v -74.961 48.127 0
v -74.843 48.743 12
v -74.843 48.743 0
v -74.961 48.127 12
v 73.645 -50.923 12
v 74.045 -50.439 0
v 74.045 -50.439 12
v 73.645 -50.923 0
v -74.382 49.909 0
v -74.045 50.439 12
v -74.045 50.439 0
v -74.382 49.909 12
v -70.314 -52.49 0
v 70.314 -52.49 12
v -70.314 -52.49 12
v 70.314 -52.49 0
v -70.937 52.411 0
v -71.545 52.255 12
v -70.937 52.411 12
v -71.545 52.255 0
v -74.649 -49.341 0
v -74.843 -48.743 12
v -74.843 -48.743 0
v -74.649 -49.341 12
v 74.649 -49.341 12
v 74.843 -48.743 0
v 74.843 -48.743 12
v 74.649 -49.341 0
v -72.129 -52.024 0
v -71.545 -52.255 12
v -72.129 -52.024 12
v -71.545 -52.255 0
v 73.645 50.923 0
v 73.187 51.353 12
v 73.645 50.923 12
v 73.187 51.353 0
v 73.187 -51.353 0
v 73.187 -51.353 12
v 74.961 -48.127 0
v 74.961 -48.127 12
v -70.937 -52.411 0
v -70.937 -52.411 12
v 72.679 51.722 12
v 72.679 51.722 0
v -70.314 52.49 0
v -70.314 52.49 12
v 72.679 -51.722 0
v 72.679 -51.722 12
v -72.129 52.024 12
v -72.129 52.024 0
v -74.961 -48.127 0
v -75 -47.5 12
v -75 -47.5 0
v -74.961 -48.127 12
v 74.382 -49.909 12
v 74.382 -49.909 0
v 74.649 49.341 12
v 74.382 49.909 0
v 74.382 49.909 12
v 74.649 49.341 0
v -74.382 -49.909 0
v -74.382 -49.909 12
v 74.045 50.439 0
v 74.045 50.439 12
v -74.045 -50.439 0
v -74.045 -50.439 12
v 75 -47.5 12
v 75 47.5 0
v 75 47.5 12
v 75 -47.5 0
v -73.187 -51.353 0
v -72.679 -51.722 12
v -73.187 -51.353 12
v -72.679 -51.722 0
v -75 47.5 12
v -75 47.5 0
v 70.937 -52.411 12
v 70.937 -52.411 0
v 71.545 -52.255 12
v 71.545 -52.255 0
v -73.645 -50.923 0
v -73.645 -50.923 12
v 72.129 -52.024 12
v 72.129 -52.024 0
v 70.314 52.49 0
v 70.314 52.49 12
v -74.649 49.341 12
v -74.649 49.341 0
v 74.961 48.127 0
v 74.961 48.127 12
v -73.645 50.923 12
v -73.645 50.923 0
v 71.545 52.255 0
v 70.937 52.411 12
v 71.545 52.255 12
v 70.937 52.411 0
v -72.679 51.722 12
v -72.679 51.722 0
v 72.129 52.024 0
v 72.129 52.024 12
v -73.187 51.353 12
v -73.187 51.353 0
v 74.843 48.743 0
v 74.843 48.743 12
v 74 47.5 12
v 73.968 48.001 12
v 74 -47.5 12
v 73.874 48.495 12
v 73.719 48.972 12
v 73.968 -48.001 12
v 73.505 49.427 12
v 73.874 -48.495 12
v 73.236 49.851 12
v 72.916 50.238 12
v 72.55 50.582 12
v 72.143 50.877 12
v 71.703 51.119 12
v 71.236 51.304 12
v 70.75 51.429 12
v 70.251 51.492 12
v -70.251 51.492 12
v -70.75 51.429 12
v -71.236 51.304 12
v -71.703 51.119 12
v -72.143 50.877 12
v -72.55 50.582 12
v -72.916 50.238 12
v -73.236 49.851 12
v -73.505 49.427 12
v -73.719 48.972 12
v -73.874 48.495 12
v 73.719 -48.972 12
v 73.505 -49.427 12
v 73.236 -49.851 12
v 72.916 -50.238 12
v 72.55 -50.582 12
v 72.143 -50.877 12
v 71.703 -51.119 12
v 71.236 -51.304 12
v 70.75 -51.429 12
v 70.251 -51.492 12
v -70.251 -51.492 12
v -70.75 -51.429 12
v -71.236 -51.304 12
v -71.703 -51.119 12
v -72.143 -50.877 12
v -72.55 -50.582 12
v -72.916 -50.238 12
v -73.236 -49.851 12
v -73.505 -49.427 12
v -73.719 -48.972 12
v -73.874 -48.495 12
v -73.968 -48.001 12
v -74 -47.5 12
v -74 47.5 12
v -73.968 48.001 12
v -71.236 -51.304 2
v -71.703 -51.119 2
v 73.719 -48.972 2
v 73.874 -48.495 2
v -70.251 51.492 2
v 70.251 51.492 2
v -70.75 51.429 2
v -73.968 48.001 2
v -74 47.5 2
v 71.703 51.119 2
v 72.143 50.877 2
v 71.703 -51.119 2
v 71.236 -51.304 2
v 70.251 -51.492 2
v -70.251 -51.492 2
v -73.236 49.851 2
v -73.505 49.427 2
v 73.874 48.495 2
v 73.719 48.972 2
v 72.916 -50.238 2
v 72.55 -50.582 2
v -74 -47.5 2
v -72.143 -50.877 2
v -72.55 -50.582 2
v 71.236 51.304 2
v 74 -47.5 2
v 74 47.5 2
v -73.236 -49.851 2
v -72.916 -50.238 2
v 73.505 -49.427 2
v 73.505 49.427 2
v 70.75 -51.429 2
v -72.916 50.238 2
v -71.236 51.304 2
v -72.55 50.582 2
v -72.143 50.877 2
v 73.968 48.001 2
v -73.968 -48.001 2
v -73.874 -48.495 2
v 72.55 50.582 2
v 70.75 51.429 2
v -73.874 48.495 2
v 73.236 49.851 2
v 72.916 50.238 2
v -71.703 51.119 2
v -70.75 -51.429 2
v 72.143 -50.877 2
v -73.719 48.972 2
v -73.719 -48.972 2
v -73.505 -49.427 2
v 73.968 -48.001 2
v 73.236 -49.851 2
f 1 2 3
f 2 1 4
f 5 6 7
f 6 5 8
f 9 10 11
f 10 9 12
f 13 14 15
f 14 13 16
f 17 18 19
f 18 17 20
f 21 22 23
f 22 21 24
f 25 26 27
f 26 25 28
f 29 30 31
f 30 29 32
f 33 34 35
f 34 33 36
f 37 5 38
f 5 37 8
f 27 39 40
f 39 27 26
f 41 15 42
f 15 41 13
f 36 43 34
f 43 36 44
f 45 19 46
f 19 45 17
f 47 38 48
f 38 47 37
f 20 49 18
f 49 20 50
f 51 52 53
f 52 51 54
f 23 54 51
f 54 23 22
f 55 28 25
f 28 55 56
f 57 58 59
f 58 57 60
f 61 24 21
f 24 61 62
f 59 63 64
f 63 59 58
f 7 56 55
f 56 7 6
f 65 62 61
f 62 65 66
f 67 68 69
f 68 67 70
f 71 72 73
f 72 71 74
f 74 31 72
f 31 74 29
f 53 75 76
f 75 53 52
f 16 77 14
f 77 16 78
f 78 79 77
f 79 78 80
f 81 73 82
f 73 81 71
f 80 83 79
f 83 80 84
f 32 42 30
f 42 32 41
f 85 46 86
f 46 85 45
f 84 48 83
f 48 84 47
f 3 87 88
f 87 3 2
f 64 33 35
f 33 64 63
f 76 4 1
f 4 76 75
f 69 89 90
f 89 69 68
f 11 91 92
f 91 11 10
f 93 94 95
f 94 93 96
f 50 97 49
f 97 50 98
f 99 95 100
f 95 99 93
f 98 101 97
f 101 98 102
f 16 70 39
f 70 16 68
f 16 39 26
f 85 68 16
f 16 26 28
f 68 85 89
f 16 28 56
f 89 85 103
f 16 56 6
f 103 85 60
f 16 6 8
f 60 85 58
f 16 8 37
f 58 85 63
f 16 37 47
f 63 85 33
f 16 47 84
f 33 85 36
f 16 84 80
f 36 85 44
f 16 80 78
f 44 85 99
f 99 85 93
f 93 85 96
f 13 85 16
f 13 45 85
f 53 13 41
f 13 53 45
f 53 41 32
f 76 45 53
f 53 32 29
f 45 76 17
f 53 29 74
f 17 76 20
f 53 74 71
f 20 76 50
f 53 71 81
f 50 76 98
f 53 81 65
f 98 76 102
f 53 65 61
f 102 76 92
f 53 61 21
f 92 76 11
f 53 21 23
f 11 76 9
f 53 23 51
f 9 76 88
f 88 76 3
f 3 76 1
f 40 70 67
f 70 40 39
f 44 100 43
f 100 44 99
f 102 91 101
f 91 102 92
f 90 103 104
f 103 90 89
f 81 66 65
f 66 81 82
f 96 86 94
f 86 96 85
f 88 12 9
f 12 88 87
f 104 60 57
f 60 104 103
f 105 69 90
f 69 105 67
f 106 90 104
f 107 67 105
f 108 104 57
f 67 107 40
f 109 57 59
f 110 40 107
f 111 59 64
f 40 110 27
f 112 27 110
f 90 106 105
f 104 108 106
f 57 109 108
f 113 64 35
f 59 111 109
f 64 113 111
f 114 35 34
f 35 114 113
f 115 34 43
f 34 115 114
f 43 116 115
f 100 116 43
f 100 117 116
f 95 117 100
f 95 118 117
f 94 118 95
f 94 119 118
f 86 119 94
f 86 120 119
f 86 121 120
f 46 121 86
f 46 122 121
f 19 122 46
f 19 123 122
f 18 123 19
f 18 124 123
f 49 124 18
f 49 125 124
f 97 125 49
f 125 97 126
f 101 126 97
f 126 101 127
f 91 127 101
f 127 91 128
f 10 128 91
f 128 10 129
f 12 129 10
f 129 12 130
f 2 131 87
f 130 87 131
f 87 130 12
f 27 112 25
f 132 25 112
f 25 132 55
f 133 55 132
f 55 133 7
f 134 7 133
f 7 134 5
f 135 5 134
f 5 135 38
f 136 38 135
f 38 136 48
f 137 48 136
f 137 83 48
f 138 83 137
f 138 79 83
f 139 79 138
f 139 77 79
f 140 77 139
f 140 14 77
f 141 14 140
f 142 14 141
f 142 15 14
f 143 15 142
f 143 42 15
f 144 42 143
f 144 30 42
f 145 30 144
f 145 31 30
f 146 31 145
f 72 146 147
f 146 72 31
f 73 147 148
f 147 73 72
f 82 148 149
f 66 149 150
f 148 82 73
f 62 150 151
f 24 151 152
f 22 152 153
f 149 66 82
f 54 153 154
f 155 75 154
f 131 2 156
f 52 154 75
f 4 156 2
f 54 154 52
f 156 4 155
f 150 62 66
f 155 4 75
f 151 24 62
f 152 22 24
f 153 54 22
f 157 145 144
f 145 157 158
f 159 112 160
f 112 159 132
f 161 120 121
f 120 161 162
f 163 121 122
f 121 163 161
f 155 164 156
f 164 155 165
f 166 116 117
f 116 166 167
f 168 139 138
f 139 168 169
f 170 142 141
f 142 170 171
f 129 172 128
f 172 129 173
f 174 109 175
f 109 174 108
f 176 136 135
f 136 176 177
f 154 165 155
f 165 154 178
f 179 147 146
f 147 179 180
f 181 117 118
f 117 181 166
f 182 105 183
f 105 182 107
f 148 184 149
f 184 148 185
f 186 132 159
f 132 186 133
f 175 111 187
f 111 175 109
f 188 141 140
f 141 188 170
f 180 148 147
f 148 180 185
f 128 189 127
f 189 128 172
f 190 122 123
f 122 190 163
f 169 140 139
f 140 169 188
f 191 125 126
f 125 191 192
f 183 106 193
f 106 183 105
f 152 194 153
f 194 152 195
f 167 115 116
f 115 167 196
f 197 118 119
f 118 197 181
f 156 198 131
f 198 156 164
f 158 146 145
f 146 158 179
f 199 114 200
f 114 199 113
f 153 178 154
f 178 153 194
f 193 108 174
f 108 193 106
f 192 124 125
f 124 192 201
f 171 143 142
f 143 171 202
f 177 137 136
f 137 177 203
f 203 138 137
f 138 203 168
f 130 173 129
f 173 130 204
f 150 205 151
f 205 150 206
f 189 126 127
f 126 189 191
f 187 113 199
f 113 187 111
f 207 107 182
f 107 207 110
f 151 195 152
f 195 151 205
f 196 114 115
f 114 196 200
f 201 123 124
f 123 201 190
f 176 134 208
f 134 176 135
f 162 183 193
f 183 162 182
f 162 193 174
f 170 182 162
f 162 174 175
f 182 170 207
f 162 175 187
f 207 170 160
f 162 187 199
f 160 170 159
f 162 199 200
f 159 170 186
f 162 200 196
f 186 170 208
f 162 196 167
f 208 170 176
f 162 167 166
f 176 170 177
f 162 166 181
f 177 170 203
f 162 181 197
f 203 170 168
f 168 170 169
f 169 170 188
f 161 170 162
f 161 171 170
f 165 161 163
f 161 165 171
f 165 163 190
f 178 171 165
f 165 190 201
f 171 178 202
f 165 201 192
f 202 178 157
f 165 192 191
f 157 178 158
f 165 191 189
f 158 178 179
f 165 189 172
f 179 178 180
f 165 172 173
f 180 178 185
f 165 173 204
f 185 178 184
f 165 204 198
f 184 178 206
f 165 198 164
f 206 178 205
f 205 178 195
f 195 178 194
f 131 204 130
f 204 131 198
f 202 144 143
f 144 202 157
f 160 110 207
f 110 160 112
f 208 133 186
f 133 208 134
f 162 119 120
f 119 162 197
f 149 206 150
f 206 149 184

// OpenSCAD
$fn = 50;


difference() {
	union() {
		hull() {
			translate(v = [-70.0000000000, 47.5000000000, 0]) {
				cylinder(h = 12, r = 5);
			}
			translate(v = [70.0000000000, 47.5000000000, 0]) {
				cylinder(h = 12, r = 5);
			}
			translate(v = [-70.0000000000, -47.5000000000, 0]) {
				cylinder(h = 12, r = 5);
			}
			translate(v = [70.0000000000, -47.5000000000, 0]) {
				cylinder(h = 12, r = 5);
			}
		}
	}
	union() {
		translate(v = [0, 0, 2]) {
			hull() {
				translate(v = [-70.0000000000, 47.5000000000, 0]) {
					cylinder(h = 10, r = 4);
				}
				translate(v = [70.0000000000, 47.5000000000, 0]) {
					cylinder(h = 10, r = 4);
				}
				translate(v = [-70.0000000000, -47.5000000000, 0]) {
					cylinder(h = 10, r = 4);
				}
				translate(v = [70.0000000000, -47.5000000000, 0]) {
					cylinder(h = 10, r = 4);
				}
			}
		}
	}
}
